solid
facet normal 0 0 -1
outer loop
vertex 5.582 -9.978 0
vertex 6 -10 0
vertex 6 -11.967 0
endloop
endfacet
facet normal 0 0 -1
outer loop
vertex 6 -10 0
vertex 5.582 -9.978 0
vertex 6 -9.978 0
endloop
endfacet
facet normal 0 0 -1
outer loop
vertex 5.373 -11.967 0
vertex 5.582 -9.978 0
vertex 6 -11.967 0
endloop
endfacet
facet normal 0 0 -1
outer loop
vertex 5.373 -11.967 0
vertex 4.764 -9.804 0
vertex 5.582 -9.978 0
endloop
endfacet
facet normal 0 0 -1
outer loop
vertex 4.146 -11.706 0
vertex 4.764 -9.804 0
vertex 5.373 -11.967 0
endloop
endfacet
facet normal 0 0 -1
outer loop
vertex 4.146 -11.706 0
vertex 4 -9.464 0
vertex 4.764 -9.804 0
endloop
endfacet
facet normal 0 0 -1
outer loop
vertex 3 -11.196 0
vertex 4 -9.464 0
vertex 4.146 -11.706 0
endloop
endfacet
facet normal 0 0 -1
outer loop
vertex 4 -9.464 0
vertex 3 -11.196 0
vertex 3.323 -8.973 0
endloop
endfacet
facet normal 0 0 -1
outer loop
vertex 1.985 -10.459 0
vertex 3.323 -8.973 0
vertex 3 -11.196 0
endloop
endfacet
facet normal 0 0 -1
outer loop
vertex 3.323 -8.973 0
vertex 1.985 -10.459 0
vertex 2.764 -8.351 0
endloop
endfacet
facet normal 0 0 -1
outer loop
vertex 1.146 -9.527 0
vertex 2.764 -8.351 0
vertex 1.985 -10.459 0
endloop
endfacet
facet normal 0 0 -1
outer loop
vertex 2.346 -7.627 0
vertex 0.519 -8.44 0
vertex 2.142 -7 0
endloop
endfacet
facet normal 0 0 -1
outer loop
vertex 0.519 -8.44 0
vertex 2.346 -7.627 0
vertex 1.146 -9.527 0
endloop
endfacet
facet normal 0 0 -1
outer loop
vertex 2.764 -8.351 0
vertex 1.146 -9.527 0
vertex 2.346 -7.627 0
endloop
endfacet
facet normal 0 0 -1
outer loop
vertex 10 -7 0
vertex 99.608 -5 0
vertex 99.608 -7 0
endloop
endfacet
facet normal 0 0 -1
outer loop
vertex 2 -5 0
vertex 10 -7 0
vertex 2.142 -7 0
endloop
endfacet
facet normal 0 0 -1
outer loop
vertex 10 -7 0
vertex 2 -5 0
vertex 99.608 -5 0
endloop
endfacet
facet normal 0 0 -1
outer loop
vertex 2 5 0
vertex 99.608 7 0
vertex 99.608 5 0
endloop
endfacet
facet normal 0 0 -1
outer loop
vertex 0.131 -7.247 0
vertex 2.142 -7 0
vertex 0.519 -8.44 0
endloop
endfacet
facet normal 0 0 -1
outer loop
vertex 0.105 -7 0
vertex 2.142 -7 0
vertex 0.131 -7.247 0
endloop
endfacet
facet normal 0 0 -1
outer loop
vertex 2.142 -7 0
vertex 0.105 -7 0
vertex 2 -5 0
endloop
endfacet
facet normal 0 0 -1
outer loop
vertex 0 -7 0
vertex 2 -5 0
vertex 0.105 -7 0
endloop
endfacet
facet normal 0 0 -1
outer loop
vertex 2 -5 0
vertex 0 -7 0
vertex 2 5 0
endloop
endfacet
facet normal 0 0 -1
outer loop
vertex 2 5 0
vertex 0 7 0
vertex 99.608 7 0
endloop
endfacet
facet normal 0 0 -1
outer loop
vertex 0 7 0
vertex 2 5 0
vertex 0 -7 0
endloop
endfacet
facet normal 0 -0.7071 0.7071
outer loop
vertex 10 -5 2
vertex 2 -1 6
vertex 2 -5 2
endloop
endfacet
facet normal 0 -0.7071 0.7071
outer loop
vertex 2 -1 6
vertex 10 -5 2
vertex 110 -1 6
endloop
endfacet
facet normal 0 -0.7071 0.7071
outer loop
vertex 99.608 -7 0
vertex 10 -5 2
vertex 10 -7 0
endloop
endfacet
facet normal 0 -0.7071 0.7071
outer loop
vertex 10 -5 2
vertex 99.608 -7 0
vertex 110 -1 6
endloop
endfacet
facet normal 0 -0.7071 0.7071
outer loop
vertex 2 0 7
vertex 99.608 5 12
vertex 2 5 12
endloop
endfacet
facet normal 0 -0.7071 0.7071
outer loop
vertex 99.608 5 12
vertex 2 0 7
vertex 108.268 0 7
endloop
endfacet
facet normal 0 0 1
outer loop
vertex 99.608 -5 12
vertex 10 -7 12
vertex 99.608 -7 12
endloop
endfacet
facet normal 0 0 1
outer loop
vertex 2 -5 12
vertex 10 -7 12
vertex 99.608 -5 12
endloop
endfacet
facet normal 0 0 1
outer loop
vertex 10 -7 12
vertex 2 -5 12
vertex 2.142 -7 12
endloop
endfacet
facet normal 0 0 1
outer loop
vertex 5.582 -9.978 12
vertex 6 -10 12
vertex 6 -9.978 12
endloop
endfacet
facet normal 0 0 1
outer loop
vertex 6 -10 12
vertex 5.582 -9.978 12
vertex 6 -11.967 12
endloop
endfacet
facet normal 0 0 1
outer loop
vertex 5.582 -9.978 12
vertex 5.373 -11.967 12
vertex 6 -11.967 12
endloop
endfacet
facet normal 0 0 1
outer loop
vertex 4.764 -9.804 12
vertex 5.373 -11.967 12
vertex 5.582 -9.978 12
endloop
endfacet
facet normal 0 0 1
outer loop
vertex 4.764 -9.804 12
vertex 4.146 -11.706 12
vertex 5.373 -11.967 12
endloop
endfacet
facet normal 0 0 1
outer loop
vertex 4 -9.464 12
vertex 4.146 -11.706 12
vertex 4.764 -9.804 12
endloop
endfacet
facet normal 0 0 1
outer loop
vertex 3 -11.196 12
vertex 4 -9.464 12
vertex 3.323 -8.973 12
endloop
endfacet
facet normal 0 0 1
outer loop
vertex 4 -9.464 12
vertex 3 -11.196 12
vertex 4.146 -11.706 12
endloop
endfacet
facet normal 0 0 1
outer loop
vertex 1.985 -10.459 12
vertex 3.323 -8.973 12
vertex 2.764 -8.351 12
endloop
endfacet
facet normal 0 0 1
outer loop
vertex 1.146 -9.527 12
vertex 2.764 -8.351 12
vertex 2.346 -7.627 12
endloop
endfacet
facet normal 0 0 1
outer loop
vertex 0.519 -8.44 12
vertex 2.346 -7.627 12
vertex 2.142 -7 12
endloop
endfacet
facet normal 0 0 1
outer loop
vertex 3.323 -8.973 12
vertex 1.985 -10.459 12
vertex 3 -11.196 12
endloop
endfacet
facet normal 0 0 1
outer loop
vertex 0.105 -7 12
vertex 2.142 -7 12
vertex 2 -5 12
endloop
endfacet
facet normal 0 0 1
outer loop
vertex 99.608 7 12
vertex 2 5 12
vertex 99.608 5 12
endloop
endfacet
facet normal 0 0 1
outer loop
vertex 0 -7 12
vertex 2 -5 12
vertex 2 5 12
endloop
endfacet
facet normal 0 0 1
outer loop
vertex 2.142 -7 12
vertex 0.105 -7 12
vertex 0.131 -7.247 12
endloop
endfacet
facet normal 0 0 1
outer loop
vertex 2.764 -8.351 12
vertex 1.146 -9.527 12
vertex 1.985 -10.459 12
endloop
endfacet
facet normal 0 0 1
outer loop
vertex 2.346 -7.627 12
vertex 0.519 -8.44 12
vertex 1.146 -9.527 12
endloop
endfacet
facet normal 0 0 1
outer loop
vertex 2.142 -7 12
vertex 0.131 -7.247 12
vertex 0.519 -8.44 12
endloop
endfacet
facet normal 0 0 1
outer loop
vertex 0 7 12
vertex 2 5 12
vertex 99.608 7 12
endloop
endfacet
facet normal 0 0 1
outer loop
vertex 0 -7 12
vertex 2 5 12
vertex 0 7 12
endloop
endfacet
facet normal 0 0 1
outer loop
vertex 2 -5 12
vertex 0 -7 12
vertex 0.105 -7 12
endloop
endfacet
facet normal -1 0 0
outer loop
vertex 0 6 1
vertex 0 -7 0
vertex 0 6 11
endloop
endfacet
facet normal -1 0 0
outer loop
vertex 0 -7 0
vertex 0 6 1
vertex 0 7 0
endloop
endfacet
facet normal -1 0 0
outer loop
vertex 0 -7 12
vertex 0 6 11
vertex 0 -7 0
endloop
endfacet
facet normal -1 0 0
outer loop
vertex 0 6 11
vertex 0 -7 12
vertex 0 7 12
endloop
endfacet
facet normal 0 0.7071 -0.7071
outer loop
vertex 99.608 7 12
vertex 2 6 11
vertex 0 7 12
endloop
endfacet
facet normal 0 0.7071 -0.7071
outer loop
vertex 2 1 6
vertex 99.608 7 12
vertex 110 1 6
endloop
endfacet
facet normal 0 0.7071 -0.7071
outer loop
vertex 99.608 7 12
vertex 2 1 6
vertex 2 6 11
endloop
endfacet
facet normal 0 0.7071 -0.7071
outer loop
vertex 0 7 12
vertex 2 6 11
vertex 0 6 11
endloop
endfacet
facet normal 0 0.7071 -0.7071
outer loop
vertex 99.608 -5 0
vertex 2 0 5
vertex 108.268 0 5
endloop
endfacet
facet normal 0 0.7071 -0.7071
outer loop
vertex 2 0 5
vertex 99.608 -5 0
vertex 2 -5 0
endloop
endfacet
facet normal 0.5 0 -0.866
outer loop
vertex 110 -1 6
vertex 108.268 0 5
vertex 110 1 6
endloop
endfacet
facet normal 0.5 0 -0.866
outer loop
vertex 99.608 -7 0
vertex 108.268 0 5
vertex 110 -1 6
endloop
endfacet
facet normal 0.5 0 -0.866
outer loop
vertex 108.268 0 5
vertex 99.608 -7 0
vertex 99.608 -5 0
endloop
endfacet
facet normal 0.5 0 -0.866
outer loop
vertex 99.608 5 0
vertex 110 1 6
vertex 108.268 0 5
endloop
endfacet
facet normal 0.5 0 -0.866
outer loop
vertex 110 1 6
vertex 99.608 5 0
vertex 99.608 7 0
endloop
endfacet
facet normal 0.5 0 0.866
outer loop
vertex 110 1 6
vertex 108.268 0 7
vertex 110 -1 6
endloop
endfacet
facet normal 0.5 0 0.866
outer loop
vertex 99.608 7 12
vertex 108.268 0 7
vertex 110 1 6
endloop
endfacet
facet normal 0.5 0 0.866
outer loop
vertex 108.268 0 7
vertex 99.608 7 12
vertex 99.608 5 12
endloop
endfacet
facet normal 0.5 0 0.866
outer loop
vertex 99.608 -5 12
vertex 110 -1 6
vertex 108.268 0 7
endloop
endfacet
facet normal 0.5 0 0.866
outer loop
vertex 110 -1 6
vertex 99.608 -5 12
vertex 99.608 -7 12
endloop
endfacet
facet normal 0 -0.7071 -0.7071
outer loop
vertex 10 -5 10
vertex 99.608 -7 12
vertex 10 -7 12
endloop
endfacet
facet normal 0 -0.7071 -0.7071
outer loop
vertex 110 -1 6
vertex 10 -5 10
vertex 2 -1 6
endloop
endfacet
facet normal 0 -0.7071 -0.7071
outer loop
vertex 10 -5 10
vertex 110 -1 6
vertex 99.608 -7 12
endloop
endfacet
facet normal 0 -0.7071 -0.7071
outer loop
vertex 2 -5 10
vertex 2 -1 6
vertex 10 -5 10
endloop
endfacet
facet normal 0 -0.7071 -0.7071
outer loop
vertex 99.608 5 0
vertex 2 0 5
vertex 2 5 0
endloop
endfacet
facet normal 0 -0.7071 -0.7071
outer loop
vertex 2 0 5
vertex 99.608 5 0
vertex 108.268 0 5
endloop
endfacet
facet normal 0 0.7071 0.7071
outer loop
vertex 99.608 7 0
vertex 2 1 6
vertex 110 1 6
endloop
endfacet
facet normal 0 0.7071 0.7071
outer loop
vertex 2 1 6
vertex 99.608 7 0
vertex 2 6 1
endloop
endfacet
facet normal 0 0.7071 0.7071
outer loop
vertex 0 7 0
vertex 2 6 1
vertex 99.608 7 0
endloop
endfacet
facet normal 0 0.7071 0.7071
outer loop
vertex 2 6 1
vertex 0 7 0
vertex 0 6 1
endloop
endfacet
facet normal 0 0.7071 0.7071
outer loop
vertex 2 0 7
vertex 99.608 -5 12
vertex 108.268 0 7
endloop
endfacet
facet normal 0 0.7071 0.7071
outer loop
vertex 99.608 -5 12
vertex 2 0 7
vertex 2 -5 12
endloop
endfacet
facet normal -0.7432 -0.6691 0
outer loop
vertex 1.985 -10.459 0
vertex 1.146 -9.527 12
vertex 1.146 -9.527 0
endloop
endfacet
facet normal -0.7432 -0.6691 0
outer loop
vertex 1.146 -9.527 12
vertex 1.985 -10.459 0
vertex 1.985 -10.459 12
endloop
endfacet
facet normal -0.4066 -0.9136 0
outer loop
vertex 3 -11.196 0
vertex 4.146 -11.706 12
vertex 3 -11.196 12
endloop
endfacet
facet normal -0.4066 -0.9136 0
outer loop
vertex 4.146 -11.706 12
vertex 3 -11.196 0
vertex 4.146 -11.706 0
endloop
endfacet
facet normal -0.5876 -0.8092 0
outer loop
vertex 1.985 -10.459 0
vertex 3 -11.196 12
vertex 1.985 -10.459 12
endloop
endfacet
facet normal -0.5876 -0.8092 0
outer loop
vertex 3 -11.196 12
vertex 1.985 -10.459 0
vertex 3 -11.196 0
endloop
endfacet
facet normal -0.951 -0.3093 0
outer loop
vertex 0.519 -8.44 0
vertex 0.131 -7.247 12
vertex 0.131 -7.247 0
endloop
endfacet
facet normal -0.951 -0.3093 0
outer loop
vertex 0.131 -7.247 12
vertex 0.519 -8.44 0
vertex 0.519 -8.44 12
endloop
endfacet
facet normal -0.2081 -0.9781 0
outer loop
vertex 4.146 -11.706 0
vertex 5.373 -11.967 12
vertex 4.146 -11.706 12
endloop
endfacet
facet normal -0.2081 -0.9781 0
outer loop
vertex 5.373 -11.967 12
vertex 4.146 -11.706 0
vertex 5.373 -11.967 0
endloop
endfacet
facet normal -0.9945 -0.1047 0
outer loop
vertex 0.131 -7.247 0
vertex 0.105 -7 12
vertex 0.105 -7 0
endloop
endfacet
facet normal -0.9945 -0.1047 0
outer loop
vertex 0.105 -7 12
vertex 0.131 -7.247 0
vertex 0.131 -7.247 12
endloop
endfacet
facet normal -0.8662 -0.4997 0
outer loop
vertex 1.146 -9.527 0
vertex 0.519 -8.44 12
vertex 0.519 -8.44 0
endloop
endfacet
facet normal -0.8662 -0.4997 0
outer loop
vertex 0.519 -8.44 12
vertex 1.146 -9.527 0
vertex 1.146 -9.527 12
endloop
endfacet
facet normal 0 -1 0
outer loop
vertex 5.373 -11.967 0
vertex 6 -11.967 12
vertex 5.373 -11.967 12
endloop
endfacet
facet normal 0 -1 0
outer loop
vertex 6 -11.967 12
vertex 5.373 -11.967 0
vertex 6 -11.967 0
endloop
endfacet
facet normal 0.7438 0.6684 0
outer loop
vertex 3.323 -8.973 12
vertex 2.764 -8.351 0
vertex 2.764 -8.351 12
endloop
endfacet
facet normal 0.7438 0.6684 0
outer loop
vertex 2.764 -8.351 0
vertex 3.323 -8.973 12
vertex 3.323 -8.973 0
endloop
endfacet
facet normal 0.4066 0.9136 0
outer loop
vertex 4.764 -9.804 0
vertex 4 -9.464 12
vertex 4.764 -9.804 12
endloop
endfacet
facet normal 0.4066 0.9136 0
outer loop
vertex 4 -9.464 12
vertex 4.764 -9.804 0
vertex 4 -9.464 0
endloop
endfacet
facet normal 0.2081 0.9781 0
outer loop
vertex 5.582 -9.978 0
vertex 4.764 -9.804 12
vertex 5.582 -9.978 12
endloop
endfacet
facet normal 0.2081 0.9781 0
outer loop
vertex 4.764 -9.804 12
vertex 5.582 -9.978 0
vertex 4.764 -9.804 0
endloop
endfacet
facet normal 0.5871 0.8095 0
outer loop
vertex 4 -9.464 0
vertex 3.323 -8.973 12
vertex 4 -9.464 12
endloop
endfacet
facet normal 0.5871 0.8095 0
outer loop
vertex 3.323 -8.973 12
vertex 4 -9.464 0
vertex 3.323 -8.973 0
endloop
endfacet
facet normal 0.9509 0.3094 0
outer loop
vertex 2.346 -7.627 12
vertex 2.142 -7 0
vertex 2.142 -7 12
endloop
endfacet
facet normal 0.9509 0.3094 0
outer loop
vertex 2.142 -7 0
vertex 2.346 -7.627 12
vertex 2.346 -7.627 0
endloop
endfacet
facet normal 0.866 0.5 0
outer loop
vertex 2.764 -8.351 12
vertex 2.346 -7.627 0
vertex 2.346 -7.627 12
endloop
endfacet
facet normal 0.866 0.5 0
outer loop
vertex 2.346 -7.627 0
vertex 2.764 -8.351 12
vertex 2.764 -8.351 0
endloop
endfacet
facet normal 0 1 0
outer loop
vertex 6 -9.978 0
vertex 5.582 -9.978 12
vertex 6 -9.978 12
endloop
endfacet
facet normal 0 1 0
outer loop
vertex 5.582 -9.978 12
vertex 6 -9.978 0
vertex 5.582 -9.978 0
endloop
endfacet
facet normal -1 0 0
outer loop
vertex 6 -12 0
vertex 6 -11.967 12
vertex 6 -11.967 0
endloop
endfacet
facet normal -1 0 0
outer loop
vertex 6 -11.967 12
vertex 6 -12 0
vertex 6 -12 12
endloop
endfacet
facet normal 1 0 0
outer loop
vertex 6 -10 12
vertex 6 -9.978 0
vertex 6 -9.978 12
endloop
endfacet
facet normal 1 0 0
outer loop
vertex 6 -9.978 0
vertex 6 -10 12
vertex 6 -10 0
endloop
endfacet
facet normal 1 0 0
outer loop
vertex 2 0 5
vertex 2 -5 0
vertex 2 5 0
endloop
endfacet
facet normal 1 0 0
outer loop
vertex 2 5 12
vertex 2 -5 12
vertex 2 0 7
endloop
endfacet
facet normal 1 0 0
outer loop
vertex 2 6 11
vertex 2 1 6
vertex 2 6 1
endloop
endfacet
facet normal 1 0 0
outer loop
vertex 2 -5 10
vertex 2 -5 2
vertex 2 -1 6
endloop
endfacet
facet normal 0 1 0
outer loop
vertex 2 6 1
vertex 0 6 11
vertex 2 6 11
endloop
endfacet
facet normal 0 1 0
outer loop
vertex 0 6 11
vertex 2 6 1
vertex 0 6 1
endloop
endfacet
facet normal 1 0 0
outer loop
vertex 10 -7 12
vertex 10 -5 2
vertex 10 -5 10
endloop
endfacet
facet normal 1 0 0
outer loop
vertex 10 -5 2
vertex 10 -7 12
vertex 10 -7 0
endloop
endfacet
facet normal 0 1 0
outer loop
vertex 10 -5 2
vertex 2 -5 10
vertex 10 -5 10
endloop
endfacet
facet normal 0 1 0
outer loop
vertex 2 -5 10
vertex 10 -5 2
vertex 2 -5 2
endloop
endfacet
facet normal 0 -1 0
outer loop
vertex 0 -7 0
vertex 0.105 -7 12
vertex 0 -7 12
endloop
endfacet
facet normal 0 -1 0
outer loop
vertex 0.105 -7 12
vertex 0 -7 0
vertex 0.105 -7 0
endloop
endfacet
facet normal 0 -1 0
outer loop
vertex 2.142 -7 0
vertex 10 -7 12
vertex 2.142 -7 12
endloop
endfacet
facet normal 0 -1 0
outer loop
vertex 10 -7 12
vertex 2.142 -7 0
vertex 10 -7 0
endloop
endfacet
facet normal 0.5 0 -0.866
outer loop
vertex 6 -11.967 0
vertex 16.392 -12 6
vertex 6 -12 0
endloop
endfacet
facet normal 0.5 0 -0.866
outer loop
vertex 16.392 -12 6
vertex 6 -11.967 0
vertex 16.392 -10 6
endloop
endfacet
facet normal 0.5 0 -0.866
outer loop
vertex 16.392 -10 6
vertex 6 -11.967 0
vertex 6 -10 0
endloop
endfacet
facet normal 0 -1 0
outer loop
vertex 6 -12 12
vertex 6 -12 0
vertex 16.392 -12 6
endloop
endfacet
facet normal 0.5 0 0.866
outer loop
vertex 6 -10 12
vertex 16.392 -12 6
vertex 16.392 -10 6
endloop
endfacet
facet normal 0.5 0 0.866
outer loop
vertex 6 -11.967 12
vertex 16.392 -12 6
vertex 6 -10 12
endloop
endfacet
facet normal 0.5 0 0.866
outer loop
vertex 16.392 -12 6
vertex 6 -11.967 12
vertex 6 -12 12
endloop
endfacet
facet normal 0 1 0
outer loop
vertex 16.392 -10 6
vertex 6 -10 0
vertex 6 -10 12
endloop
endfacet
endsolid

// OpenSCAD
//
//  Pegs for robot mower perimeter wire
//
//  Should print as is, no support needed
//  Best material is probably ABS
//
//  Design by Egil Kvaleberg, 20 April 2016
//

peg_length = 110.0;
peg_wall = 2.0;
peg_width = 12.0;
peg_slot = 4.0;
// max degrees of overhang supported by printer/material. 45 is usually safe
max_overhang = 30.0; // degrees
tip_len = peg_width / (2*tan(max_overhang)); // BUG:
d = 1*0.01;

module bar(slant) {
    points = [
      [0,-peg_wall/2,0],
      [peg_length-tip_len,-peg_wall/2,0],
      [peg_length-tip_len,peg_wall/2,0],
      [0,peg_wall/2,0],
      [0,slant-peg_wall/2,peg_width],
      [peg_length-tip_len,slant-peg_wall/2,peg_width],
      [peg_length-tip_len,slant+peg_wall/2,peg_width],
      [0,slant+peg_wall/2,peg_width]];
    faces = [
      [0,1,2,3],  // bottom
      [4,5,1,0],  // front
      [7,6,5,4],  // top
      [5,6,2,1],  // right
      [6,7,3,2],  // back
      [7,4,0,3]]; // left          
    polyhedron(points, faces);
    translate([peg_length-tip_len, 0, 0]) tip(slant);
}
module tip(slant) {
    points = [
      [0,-peg_wall/2,0],
      [tip_len,slant/2-peg_wall/2,peg_width/2],
      [tip_len,slant/2+peg_wall/2,peg_width/2],
      [0,peg_wall/2,0],
      [0,slant-peg_wall/2,peg_width],
      [0,slant+peg_wall/2,peg_width]];
    faces = [
      [0,1,2,3],  // bottom
      [4,1,0],    // front
      [5,2,1,4],  // top
      [5,3,2],    // back
      [5,4,0,3]]; // left  
    polyhedron(points, faces);
}
translate([0, -peg_width/2, 0]) bar(peg_width);
translate([0, peg_width/2, 0])  bar(-peg_width);
translate([0, -peg_width/2, 0]) cube([peg_wall,peg_width,peg_width]);
translate([0, -peg_width/2-peg_wall/2, 0]) cube([2*peg_slot+peg_wall,peg_wall,peg_width]);
intersection() {
    translate([0, -peg_width, -d]) cube([peg_slot+peg_wall,peg_slot+peg_wall,peg_width+2*d]);
    translate([peg_slot+peg_wall, -peg_width/2, 0]) {
        difference() {
            cylinder(r=peg_slot+peg_wall, h=peg_width, $fn=30);
            translate([0,0,-d]) cylinder(r=peg_slot, h=peg_width+2*d, $fn=30);
        }
    }
}
translate([peg_slot+peg_wall, -peg_width/2-peg_slot-peg_wall/2, 0]) tip(0);
